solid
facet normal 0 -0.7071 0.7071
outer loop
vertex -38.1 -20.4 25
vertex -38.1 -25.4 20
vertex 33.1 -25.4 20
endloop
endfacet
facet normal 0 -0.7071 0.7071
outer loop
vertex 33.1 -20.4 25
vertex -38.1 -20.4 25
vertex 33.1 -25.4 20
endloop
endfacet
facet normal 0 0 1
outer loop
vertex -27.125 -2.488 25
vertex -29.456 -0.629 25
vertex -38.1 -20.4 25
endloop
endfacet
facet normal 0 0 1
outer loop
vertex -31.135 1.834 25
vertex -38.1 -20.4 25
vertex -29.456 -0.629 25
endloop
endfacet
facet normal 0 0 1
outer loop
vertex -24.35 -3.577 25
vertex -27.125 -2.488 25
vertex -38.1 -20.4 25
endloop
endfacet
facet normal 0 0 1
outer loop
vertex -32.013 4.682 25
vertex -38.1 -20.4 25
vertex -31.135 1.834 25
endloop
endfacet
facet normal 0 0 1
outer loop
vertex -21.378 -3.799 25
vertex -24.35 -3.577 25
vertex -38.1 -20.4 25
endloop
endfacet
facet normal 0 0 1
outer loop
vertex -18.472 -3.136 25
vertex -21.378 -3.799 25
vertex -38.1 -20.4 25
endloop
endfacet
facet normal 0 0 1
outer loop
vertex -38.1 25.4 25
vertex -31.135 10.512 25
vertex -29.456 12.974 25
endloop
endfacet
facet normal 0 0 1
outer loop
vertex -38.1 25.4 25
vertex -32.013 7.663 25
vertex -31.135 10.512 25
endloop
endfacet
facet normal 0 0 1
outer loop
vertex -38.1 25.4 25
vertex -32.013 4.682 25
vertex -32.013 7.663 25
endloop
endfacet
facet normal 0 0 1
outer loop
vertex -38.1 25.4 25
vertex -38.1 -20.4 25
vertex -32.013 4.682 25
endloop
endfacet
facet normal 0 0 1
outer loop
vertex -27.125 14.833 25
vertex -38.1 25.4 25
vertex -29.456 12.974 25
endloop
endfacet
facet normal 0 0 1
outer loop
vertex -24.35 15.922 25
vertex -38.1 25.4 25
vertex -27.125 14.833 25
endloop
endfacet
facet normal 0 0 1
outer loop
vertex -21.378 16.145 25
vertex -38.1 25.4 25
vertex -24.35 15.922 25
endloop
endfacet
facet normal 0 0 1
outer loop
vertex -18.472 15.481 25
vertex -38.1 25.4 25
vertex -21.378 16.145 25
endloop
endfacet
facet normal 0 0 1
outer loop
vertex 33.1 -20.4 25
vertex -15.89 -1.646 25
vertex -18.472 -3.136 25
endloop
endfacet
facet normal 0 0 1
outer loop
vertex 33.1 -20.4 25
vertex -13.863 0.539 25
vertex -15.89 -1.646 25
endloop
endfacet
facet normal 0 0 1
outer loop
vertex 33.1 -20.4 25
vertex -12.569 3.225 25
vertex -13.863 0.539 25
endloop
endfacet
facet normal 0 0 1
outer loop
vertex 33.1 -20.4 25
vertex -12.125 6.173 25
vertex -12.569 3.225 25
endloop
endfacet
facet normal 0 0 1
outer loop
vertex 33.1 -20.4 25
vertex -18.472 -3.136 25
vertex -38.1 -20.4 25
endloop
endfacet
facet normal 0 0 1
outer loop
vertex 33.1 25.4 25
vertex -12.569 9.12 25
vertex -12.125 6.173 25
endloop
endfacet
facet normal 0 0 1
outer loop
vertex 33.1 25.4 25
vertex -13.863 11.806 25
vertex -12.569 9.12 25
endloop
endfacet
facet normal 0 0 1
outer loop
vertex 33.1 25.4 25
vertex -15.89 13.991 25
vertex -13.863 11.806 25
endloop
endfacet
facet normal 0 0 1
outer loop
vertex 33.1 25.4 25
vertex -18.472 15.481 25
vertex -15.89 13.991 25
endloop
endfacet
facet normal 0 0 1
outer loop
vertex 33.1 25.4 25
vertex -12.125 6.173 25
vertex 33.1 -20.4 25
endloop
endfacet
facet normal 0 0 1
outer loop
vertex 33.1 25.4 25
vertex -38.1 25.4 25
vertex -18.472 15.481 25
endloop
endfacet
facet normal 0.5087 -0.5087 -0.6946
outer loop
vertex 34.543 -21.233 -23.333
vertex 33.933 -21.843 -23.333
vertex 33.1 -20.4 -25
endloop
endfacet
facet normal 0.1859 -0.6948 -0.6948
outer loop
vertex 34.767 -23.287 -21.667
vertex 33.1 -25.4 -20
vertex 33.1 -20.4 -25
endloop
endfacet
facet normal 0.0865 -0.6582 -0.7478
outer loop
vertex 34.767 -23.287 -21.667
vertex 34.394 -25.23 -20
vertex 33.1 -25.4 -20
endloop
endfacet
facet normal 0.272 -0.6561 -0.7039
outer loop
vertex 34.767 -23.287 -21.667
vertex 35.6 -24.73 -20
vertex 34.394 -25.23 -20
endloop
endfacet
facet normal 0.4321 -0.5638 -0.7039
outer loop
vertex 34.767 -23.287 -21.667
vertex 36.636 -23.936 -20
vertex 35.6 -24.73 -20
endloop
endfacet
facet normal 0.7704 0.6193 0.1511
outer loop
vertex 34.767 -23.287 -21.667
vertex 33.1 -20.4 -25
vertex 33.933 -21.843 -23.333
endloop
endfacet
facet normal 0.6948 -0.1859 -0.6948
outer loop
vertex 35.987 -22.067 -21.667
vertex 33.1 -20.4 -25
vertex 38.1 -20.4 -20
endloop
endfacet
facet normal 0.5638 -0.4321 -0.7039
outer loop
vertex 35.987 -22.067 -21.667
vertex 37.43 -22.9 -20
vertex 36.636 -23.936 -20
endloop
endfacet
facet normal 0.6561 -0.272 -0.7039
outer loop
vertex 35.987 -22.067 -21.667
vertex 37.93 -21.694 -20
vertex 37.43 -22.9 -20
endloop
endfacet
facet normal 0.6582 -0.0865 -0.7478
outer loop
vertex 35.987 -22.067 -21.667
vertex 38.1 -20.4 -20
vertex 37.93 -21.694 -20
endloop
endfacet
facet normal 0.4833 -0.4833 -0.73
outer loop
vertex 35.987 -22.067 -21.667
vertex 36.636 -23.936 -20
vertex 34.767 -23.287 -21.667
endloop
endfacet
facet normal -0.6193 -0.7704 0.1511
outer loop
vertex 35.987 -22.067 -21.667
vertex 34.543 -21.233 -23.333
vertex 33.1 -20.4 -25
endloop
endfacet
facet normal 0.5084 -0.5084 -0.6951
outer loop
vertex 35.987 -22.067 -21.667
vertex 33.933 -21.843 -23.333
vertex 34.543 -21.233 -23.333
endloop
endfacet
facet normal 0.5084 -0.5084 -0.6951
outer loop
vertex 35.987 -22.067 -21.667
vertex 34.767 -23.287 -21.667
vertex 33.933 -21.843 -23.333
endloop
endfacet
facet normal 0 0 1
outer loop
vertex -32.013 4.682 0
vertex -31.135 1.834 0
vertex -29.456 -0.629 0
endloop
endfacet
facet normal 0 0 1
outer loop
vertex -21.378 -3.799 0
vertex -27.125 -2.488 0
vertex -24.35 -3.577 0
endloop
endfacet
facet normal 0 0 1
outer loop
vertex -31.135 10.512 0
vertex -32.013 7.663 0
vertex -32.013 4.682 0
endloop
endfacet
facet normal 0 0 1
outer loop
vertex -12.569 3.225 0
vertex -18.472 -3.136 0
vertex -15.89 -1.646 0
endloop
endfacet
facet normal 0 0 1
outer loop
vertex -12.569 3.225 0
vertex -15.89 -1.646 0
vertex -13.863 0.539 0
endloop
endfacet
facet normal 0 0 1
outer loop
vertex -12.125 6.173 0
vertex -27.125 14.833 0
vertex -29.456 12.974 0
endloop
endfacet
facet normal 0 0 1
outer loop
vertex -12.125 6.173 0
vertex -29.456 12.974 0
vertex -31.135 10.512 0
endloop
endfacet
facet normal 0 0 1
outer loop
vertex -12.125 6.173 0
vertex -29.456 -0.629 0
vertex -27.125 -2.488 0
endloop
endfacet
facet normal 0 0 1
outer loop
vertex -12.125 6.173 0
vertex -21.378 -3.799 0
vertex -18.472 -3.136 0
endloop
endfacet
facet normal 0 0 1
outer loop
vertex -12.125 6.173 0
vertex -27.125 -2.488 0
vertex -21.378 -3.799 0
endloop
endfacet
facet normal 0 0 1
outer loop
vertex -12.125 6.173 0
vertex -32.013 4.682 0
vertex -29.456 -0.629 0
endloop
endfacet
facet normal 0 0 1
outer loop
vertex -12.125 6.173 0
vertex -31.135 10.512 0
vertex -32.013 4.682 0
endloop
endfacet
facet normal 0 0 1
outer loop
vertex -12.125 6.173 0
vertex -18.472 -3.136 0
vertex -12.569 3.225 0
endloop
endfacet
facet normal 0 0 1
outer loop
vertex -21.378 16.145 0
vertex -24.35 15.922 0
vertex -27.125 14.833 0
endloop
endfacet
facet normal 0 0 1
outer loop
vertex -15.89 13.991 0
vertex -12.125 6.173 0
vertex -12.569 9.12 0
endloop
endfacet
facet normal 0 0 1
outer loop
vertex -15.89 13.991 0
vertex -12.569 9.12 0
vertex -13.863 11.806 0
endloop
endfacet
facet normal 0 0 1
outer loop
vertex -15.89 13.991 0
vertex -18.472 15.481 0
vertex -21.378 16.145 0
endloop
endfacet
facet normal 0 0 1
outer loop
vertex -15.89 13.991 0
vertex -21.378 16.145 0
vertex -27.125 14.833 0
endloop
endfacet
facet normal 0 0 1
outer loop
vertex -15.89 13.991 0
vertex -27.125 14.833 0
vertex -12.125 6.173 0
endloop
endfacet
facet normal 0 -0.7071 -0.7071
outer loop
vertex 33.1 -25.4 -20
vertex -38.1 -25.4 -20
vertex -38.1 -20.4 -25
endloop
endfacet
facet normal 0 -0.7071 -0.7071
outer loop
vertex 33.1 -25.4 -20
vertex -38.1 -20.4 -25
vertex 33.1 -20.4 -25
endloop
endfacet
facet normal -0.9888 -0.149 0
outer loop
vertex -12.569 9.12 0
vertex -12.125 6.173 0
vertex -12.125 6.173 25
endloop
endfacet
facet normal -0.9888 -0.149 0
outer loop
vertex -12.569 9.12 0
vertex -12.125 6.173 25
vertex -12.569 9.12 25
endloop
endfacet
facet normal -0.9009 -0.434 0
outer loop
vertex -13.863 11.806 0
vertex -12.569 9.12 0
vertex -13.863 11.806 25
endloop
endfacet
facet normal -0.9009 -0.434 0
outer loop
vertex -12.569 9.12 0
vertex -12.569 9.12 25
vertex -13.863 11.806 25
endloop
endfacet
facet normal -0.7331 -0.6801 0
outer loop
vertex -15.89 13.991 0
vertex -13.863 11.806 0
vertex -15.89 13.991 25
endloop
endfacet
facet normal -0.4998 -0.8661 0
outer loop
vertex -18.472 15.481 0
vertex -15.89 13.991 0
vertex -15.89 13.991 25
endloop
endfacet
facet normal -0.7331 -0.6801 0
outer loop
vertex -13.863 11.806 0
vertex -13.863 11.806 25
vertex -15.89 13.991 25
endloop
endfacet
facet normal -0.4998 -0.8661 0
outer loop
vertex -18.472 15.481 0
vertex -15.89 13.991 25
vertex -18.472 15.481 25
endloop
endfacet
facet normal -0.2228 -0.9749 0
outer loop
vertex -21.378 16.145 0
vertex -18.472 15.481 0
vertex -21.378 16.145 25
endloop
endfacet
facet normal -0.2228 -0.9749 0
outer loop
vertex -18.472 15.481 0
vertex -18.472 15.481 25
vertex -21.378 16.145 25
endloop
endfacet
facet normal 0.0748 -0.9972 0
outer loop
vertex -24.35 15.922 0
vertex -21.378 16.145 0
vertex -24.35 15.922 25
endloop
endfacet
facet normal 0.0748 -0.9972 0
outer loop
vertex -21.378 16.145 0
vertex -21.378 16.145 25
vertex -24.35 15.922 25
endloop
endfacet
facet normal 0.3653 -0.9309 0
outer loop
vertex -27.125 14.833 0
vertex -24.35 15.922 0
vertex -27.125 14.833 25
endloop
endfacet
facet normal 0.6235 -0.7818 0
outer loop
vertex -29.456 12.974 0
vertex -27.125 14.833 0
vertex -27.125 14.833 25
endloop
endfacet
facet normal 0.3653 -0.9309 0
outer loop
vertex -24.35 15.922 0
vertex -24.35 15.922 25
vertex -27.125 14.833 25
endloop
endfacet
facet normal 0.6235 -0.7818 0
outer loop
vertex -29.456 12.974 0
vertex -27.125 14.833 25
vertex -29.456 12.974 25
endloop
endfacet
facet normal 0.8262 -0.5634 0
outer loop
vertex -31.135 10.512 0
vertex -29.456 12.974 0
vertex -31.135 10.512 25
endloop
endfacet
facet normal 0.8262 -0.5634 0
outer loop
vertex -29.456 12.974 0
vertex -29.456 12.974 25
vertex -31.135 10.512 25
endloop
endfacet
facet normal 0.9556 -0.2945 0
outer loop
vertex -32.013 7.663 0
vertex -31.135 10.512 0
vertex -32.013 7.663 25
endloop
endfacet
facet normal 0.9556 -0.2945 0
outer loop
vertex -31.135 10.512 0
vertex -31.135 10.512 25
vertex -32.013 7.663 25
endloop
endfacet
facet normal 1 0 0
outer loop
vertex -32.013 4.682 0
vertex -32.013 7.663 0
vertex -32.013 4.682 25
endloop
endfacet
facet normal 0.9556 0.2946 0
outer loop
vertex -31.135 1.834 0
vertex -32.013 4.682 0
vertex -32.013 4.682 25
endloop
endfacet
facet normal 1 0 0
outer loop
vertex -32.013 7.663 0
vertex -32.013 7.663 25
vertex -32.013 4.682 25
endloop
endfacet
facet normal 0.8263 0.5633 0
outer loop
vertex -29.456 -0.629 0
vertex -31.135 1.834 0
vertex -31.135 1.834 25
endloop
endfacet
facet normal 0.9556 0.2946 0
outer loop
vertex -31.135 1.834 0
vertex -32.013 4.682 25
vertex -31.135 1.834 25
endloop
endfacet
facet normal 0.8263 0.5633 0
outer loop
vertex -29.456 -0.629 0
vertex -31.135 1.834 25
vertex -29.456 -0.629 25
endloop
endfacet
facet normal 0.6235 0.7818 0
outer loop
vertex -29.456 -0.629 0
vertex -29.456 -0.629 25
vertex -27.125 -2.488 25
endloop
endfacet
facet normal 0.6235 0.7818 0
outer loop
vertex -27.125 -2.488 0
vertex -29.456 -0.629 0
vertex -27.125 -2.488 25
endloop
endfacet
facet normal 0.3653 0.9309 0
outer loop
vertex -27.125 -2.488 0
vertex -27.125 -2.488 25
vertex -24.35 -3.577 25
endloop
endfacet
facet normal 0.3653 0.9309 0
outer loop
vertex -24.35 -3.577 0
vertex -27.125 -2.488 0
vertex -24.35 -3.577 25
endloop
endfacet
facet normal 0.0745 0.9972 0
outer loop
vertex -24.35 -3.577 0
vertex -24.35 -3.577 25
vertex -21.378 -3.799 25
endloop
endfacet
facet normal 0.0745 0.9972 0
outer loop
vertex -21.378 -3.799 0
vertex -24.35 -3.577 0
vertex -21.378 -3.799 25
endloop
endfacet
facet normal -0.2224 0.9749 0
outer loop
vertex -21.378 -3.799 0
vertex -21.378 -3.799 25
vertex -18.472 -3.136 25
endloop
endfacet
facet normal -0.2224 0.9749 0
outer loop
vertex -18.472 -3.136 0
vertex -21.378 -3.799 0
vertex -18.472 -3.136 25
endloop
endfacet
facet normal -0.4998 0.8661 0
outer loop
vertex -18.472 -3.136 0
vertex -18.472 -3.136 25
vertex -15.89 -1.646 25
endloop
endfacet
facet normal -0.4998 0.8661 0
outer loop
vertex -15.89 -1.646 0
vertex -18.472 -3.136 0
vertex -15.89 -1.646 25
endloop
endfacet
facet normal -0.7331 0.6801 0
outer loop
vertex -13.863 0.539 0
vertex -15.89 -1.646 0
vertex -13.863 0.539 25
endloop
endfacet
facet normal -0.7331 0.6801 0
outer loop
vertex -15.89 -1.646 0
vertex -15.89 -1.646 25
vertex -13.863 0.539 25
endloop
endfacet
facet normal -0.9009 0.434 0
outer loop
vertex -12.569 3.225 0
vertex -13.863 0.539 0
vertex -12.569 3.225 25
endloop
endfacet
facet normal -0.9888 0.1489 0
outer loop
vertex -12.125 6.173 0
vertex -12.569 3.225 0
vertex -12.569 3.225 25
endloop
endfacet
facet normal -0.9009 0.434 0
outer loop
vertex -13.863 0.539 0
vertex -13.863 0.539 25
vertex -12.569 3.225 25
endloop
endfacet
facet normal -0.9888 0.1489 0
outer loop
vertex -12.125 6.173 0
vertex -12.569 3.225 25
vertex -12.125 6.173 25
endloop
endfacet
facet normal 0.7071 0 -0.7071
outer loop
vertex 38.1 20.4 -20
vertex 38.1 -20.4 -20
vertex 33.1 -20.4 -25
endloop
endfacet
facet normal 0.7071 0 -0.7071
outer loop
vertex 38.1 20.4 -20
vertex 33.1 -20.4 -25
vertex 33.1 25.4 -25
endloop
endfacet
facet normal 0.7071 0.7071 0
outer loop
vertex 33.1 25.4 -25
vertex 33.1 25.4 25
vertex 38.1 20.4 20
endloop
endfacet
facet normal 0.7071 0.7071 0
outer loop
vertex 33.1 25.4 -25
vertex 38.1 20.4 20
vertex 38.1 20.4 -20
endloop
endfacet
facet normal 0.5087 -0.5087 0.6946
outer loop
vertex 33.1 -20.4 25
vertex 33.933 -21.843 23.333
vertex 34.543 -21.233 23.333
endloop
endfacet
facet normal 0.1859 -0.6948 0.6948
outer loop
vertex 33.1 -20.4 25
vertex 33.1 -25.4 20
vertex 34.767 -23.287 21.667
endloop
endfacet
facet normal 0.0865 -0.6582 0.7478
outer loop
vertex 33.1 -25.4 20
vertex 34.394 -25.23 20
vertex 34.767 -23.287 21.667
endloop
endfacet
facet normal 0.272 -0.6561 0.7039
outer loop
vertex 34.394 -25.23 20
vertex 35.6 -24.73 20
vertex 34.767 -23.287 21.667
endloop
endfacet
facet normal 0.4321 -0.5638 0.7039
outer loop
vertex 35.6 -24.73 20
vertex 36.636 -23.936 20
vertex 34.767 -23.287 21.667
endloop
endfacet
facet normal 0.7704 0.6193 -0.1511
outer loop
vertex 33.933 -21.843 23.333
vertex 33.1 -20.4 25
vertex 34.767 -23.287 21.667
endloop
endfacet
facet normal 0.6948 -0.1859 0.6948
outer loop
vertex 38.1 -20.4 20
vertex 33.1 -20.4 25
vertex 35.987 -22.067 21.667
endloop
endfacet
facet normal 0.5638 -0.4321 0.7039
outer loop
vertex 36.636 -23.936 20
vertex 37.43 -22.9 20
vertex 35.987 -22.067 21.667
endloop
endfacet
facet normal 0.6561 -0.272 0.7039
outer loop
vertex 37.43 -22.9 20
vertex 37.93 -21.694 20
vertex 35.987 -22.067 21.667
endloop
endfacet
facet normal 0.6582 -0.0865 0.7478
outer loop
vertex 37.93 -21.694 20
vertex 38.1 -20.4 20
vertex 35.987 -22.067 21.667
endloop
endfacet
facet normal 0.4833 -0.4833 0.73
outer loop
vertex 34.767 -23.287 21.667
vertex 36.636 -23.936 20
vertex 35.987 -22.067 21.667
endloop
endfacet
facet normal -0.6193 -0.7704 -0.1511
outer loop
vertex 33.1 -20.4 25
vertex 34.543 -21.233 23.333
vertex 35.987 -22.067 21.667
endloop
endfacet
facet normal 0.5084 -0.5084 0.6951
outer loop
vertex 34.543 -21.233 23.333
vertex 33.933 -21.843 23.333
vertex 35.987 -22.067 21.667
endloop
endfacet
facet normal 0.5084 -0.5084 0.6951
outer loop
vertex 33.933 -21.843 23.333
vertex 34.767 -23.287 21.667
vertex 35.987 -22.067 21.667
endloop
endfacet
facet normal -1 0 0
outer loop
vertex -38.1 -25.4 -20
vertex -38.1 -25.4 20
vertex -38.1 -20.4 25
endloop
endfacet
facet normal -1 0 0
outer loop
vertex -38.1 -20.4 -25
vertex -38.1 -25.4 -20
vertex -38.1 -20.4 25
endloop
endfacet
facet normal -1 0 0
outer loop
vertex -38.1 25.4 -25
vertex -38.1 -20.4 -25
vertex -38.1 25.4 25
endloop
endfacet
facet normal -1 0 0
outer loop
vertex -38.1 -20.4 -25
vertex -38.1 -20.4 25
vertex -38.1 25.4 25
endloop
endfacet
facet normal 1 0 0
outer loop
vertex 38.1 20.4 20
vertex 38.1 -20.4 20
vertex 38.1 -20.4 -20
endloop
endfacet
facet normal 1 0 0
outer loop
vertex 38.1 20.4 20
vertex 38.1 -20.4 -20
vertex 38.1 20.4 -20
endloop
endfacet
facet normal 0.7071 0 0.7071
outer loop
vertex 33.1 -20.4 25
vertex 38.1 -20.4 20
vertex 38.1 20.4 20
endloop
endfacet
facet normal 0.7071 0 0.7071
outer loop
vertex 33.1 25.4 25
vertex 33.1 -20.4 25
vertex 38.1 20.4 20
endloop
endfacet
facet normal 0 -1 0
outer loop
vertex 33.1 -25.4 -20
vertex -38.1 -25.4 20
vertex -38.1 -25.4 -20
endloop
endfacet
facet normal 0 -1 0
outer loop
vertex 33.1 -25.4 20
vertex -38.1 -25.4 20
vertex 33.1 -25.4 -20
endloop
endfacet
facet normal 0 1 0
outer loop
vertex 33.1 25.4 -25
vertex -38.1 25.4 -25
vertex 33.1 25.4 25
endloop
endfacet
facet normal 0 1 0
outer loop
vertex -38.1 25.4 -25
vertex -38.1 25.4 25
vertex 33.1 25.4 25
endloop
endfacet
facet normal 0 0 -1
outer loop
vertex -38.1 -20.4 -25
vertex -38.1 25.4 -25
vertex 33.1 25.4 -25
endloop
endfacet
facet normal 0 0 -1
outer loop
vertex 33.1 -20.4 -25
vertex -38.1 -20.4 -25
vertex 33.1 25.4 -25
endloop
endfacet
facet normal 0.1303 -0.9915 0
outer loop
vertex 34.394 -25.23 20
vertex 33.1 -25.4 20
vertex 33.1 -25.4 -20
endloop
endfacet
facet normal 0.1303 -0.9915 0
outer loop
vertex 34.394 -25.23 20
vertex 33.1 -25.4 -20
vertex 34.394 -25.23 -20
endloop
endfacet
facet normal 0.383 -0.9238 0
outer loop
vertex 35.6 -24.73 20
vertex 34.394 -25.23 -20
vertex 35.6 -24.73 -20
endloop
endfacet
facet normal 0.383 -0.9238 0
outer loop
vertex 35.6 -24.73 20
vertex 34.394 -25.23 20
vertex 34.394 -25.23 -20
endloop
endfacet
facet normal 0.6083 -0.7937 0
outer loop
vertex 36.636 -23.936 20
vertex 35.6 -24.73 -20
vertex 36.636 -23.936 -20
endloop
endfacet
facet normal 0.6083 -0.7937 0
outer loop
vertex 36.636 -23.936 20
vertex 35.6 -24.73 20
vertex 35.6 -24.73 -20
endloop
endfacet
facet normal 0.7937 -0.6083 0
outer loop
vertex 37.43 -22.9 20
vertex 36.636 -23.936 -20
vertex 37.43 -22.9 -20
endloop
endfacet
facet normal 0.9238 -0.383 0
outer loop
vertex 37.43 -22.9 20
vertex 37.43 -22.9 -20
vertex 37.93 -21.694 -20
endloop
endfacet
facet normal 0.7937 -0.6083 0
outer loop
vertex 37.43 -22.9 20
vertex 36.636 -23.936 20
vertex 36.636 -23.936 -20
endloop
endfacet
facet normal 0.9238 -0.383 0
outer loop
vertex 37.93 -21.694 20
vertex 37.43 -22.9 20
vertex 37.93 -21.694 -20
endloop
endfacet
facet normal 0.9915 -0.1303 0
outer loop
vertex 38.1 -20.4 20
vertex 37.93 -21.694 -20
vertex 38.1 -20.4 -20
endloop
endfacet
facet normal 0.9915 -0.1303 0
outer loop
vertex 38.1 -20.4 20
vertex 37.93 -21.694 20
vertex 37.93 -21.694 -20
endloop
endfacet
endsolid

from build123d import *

# Parameters (mm, degrees)
F0_W     = 76.2
F0_H     = 50.8
F1_DEPTH = 25
F2_R     = 10
F3_DEPTH = 25
F4_R     = 5
F5_SIZE  = 5


with BuildPart() as f1:
    # F0 (on Top) → F1 (new body, symmetric)
    with BuildSketch(Plane.XY):
        Rectangle(F0_W, F0_H)
    extrude(amount=F1_DEPTH, both=True)

    # F2 (on face) → F3 (cut)
    with BuildSketch(Plane.XY.offset(25)):
        with Locations((-22.124985, 6.172692)):
            Circle(F2_R)
    extrude(amount=-F3_DEPTH, mode=Mode.SUBTRACT)

    # F4
    f4_edges = [f1.edges().sort_by_distance(p)[0] for p in [
        (38.1, -25.4, 0),
    ]]
    fillet(f4_edges, radius=F4_R)

    # F5
    f5_edges = [f1.edges().sort_by_distance(p)[0] for p in [
        (38.1, 2.5, -25),
        (38.1, -20.4, 0),
        (38.1, 25.4, 0),
        (38.1, 2.5, 25),
    ]]
    chamfer(f5_edges, length=F5_SIZE)


solid = f1.part
